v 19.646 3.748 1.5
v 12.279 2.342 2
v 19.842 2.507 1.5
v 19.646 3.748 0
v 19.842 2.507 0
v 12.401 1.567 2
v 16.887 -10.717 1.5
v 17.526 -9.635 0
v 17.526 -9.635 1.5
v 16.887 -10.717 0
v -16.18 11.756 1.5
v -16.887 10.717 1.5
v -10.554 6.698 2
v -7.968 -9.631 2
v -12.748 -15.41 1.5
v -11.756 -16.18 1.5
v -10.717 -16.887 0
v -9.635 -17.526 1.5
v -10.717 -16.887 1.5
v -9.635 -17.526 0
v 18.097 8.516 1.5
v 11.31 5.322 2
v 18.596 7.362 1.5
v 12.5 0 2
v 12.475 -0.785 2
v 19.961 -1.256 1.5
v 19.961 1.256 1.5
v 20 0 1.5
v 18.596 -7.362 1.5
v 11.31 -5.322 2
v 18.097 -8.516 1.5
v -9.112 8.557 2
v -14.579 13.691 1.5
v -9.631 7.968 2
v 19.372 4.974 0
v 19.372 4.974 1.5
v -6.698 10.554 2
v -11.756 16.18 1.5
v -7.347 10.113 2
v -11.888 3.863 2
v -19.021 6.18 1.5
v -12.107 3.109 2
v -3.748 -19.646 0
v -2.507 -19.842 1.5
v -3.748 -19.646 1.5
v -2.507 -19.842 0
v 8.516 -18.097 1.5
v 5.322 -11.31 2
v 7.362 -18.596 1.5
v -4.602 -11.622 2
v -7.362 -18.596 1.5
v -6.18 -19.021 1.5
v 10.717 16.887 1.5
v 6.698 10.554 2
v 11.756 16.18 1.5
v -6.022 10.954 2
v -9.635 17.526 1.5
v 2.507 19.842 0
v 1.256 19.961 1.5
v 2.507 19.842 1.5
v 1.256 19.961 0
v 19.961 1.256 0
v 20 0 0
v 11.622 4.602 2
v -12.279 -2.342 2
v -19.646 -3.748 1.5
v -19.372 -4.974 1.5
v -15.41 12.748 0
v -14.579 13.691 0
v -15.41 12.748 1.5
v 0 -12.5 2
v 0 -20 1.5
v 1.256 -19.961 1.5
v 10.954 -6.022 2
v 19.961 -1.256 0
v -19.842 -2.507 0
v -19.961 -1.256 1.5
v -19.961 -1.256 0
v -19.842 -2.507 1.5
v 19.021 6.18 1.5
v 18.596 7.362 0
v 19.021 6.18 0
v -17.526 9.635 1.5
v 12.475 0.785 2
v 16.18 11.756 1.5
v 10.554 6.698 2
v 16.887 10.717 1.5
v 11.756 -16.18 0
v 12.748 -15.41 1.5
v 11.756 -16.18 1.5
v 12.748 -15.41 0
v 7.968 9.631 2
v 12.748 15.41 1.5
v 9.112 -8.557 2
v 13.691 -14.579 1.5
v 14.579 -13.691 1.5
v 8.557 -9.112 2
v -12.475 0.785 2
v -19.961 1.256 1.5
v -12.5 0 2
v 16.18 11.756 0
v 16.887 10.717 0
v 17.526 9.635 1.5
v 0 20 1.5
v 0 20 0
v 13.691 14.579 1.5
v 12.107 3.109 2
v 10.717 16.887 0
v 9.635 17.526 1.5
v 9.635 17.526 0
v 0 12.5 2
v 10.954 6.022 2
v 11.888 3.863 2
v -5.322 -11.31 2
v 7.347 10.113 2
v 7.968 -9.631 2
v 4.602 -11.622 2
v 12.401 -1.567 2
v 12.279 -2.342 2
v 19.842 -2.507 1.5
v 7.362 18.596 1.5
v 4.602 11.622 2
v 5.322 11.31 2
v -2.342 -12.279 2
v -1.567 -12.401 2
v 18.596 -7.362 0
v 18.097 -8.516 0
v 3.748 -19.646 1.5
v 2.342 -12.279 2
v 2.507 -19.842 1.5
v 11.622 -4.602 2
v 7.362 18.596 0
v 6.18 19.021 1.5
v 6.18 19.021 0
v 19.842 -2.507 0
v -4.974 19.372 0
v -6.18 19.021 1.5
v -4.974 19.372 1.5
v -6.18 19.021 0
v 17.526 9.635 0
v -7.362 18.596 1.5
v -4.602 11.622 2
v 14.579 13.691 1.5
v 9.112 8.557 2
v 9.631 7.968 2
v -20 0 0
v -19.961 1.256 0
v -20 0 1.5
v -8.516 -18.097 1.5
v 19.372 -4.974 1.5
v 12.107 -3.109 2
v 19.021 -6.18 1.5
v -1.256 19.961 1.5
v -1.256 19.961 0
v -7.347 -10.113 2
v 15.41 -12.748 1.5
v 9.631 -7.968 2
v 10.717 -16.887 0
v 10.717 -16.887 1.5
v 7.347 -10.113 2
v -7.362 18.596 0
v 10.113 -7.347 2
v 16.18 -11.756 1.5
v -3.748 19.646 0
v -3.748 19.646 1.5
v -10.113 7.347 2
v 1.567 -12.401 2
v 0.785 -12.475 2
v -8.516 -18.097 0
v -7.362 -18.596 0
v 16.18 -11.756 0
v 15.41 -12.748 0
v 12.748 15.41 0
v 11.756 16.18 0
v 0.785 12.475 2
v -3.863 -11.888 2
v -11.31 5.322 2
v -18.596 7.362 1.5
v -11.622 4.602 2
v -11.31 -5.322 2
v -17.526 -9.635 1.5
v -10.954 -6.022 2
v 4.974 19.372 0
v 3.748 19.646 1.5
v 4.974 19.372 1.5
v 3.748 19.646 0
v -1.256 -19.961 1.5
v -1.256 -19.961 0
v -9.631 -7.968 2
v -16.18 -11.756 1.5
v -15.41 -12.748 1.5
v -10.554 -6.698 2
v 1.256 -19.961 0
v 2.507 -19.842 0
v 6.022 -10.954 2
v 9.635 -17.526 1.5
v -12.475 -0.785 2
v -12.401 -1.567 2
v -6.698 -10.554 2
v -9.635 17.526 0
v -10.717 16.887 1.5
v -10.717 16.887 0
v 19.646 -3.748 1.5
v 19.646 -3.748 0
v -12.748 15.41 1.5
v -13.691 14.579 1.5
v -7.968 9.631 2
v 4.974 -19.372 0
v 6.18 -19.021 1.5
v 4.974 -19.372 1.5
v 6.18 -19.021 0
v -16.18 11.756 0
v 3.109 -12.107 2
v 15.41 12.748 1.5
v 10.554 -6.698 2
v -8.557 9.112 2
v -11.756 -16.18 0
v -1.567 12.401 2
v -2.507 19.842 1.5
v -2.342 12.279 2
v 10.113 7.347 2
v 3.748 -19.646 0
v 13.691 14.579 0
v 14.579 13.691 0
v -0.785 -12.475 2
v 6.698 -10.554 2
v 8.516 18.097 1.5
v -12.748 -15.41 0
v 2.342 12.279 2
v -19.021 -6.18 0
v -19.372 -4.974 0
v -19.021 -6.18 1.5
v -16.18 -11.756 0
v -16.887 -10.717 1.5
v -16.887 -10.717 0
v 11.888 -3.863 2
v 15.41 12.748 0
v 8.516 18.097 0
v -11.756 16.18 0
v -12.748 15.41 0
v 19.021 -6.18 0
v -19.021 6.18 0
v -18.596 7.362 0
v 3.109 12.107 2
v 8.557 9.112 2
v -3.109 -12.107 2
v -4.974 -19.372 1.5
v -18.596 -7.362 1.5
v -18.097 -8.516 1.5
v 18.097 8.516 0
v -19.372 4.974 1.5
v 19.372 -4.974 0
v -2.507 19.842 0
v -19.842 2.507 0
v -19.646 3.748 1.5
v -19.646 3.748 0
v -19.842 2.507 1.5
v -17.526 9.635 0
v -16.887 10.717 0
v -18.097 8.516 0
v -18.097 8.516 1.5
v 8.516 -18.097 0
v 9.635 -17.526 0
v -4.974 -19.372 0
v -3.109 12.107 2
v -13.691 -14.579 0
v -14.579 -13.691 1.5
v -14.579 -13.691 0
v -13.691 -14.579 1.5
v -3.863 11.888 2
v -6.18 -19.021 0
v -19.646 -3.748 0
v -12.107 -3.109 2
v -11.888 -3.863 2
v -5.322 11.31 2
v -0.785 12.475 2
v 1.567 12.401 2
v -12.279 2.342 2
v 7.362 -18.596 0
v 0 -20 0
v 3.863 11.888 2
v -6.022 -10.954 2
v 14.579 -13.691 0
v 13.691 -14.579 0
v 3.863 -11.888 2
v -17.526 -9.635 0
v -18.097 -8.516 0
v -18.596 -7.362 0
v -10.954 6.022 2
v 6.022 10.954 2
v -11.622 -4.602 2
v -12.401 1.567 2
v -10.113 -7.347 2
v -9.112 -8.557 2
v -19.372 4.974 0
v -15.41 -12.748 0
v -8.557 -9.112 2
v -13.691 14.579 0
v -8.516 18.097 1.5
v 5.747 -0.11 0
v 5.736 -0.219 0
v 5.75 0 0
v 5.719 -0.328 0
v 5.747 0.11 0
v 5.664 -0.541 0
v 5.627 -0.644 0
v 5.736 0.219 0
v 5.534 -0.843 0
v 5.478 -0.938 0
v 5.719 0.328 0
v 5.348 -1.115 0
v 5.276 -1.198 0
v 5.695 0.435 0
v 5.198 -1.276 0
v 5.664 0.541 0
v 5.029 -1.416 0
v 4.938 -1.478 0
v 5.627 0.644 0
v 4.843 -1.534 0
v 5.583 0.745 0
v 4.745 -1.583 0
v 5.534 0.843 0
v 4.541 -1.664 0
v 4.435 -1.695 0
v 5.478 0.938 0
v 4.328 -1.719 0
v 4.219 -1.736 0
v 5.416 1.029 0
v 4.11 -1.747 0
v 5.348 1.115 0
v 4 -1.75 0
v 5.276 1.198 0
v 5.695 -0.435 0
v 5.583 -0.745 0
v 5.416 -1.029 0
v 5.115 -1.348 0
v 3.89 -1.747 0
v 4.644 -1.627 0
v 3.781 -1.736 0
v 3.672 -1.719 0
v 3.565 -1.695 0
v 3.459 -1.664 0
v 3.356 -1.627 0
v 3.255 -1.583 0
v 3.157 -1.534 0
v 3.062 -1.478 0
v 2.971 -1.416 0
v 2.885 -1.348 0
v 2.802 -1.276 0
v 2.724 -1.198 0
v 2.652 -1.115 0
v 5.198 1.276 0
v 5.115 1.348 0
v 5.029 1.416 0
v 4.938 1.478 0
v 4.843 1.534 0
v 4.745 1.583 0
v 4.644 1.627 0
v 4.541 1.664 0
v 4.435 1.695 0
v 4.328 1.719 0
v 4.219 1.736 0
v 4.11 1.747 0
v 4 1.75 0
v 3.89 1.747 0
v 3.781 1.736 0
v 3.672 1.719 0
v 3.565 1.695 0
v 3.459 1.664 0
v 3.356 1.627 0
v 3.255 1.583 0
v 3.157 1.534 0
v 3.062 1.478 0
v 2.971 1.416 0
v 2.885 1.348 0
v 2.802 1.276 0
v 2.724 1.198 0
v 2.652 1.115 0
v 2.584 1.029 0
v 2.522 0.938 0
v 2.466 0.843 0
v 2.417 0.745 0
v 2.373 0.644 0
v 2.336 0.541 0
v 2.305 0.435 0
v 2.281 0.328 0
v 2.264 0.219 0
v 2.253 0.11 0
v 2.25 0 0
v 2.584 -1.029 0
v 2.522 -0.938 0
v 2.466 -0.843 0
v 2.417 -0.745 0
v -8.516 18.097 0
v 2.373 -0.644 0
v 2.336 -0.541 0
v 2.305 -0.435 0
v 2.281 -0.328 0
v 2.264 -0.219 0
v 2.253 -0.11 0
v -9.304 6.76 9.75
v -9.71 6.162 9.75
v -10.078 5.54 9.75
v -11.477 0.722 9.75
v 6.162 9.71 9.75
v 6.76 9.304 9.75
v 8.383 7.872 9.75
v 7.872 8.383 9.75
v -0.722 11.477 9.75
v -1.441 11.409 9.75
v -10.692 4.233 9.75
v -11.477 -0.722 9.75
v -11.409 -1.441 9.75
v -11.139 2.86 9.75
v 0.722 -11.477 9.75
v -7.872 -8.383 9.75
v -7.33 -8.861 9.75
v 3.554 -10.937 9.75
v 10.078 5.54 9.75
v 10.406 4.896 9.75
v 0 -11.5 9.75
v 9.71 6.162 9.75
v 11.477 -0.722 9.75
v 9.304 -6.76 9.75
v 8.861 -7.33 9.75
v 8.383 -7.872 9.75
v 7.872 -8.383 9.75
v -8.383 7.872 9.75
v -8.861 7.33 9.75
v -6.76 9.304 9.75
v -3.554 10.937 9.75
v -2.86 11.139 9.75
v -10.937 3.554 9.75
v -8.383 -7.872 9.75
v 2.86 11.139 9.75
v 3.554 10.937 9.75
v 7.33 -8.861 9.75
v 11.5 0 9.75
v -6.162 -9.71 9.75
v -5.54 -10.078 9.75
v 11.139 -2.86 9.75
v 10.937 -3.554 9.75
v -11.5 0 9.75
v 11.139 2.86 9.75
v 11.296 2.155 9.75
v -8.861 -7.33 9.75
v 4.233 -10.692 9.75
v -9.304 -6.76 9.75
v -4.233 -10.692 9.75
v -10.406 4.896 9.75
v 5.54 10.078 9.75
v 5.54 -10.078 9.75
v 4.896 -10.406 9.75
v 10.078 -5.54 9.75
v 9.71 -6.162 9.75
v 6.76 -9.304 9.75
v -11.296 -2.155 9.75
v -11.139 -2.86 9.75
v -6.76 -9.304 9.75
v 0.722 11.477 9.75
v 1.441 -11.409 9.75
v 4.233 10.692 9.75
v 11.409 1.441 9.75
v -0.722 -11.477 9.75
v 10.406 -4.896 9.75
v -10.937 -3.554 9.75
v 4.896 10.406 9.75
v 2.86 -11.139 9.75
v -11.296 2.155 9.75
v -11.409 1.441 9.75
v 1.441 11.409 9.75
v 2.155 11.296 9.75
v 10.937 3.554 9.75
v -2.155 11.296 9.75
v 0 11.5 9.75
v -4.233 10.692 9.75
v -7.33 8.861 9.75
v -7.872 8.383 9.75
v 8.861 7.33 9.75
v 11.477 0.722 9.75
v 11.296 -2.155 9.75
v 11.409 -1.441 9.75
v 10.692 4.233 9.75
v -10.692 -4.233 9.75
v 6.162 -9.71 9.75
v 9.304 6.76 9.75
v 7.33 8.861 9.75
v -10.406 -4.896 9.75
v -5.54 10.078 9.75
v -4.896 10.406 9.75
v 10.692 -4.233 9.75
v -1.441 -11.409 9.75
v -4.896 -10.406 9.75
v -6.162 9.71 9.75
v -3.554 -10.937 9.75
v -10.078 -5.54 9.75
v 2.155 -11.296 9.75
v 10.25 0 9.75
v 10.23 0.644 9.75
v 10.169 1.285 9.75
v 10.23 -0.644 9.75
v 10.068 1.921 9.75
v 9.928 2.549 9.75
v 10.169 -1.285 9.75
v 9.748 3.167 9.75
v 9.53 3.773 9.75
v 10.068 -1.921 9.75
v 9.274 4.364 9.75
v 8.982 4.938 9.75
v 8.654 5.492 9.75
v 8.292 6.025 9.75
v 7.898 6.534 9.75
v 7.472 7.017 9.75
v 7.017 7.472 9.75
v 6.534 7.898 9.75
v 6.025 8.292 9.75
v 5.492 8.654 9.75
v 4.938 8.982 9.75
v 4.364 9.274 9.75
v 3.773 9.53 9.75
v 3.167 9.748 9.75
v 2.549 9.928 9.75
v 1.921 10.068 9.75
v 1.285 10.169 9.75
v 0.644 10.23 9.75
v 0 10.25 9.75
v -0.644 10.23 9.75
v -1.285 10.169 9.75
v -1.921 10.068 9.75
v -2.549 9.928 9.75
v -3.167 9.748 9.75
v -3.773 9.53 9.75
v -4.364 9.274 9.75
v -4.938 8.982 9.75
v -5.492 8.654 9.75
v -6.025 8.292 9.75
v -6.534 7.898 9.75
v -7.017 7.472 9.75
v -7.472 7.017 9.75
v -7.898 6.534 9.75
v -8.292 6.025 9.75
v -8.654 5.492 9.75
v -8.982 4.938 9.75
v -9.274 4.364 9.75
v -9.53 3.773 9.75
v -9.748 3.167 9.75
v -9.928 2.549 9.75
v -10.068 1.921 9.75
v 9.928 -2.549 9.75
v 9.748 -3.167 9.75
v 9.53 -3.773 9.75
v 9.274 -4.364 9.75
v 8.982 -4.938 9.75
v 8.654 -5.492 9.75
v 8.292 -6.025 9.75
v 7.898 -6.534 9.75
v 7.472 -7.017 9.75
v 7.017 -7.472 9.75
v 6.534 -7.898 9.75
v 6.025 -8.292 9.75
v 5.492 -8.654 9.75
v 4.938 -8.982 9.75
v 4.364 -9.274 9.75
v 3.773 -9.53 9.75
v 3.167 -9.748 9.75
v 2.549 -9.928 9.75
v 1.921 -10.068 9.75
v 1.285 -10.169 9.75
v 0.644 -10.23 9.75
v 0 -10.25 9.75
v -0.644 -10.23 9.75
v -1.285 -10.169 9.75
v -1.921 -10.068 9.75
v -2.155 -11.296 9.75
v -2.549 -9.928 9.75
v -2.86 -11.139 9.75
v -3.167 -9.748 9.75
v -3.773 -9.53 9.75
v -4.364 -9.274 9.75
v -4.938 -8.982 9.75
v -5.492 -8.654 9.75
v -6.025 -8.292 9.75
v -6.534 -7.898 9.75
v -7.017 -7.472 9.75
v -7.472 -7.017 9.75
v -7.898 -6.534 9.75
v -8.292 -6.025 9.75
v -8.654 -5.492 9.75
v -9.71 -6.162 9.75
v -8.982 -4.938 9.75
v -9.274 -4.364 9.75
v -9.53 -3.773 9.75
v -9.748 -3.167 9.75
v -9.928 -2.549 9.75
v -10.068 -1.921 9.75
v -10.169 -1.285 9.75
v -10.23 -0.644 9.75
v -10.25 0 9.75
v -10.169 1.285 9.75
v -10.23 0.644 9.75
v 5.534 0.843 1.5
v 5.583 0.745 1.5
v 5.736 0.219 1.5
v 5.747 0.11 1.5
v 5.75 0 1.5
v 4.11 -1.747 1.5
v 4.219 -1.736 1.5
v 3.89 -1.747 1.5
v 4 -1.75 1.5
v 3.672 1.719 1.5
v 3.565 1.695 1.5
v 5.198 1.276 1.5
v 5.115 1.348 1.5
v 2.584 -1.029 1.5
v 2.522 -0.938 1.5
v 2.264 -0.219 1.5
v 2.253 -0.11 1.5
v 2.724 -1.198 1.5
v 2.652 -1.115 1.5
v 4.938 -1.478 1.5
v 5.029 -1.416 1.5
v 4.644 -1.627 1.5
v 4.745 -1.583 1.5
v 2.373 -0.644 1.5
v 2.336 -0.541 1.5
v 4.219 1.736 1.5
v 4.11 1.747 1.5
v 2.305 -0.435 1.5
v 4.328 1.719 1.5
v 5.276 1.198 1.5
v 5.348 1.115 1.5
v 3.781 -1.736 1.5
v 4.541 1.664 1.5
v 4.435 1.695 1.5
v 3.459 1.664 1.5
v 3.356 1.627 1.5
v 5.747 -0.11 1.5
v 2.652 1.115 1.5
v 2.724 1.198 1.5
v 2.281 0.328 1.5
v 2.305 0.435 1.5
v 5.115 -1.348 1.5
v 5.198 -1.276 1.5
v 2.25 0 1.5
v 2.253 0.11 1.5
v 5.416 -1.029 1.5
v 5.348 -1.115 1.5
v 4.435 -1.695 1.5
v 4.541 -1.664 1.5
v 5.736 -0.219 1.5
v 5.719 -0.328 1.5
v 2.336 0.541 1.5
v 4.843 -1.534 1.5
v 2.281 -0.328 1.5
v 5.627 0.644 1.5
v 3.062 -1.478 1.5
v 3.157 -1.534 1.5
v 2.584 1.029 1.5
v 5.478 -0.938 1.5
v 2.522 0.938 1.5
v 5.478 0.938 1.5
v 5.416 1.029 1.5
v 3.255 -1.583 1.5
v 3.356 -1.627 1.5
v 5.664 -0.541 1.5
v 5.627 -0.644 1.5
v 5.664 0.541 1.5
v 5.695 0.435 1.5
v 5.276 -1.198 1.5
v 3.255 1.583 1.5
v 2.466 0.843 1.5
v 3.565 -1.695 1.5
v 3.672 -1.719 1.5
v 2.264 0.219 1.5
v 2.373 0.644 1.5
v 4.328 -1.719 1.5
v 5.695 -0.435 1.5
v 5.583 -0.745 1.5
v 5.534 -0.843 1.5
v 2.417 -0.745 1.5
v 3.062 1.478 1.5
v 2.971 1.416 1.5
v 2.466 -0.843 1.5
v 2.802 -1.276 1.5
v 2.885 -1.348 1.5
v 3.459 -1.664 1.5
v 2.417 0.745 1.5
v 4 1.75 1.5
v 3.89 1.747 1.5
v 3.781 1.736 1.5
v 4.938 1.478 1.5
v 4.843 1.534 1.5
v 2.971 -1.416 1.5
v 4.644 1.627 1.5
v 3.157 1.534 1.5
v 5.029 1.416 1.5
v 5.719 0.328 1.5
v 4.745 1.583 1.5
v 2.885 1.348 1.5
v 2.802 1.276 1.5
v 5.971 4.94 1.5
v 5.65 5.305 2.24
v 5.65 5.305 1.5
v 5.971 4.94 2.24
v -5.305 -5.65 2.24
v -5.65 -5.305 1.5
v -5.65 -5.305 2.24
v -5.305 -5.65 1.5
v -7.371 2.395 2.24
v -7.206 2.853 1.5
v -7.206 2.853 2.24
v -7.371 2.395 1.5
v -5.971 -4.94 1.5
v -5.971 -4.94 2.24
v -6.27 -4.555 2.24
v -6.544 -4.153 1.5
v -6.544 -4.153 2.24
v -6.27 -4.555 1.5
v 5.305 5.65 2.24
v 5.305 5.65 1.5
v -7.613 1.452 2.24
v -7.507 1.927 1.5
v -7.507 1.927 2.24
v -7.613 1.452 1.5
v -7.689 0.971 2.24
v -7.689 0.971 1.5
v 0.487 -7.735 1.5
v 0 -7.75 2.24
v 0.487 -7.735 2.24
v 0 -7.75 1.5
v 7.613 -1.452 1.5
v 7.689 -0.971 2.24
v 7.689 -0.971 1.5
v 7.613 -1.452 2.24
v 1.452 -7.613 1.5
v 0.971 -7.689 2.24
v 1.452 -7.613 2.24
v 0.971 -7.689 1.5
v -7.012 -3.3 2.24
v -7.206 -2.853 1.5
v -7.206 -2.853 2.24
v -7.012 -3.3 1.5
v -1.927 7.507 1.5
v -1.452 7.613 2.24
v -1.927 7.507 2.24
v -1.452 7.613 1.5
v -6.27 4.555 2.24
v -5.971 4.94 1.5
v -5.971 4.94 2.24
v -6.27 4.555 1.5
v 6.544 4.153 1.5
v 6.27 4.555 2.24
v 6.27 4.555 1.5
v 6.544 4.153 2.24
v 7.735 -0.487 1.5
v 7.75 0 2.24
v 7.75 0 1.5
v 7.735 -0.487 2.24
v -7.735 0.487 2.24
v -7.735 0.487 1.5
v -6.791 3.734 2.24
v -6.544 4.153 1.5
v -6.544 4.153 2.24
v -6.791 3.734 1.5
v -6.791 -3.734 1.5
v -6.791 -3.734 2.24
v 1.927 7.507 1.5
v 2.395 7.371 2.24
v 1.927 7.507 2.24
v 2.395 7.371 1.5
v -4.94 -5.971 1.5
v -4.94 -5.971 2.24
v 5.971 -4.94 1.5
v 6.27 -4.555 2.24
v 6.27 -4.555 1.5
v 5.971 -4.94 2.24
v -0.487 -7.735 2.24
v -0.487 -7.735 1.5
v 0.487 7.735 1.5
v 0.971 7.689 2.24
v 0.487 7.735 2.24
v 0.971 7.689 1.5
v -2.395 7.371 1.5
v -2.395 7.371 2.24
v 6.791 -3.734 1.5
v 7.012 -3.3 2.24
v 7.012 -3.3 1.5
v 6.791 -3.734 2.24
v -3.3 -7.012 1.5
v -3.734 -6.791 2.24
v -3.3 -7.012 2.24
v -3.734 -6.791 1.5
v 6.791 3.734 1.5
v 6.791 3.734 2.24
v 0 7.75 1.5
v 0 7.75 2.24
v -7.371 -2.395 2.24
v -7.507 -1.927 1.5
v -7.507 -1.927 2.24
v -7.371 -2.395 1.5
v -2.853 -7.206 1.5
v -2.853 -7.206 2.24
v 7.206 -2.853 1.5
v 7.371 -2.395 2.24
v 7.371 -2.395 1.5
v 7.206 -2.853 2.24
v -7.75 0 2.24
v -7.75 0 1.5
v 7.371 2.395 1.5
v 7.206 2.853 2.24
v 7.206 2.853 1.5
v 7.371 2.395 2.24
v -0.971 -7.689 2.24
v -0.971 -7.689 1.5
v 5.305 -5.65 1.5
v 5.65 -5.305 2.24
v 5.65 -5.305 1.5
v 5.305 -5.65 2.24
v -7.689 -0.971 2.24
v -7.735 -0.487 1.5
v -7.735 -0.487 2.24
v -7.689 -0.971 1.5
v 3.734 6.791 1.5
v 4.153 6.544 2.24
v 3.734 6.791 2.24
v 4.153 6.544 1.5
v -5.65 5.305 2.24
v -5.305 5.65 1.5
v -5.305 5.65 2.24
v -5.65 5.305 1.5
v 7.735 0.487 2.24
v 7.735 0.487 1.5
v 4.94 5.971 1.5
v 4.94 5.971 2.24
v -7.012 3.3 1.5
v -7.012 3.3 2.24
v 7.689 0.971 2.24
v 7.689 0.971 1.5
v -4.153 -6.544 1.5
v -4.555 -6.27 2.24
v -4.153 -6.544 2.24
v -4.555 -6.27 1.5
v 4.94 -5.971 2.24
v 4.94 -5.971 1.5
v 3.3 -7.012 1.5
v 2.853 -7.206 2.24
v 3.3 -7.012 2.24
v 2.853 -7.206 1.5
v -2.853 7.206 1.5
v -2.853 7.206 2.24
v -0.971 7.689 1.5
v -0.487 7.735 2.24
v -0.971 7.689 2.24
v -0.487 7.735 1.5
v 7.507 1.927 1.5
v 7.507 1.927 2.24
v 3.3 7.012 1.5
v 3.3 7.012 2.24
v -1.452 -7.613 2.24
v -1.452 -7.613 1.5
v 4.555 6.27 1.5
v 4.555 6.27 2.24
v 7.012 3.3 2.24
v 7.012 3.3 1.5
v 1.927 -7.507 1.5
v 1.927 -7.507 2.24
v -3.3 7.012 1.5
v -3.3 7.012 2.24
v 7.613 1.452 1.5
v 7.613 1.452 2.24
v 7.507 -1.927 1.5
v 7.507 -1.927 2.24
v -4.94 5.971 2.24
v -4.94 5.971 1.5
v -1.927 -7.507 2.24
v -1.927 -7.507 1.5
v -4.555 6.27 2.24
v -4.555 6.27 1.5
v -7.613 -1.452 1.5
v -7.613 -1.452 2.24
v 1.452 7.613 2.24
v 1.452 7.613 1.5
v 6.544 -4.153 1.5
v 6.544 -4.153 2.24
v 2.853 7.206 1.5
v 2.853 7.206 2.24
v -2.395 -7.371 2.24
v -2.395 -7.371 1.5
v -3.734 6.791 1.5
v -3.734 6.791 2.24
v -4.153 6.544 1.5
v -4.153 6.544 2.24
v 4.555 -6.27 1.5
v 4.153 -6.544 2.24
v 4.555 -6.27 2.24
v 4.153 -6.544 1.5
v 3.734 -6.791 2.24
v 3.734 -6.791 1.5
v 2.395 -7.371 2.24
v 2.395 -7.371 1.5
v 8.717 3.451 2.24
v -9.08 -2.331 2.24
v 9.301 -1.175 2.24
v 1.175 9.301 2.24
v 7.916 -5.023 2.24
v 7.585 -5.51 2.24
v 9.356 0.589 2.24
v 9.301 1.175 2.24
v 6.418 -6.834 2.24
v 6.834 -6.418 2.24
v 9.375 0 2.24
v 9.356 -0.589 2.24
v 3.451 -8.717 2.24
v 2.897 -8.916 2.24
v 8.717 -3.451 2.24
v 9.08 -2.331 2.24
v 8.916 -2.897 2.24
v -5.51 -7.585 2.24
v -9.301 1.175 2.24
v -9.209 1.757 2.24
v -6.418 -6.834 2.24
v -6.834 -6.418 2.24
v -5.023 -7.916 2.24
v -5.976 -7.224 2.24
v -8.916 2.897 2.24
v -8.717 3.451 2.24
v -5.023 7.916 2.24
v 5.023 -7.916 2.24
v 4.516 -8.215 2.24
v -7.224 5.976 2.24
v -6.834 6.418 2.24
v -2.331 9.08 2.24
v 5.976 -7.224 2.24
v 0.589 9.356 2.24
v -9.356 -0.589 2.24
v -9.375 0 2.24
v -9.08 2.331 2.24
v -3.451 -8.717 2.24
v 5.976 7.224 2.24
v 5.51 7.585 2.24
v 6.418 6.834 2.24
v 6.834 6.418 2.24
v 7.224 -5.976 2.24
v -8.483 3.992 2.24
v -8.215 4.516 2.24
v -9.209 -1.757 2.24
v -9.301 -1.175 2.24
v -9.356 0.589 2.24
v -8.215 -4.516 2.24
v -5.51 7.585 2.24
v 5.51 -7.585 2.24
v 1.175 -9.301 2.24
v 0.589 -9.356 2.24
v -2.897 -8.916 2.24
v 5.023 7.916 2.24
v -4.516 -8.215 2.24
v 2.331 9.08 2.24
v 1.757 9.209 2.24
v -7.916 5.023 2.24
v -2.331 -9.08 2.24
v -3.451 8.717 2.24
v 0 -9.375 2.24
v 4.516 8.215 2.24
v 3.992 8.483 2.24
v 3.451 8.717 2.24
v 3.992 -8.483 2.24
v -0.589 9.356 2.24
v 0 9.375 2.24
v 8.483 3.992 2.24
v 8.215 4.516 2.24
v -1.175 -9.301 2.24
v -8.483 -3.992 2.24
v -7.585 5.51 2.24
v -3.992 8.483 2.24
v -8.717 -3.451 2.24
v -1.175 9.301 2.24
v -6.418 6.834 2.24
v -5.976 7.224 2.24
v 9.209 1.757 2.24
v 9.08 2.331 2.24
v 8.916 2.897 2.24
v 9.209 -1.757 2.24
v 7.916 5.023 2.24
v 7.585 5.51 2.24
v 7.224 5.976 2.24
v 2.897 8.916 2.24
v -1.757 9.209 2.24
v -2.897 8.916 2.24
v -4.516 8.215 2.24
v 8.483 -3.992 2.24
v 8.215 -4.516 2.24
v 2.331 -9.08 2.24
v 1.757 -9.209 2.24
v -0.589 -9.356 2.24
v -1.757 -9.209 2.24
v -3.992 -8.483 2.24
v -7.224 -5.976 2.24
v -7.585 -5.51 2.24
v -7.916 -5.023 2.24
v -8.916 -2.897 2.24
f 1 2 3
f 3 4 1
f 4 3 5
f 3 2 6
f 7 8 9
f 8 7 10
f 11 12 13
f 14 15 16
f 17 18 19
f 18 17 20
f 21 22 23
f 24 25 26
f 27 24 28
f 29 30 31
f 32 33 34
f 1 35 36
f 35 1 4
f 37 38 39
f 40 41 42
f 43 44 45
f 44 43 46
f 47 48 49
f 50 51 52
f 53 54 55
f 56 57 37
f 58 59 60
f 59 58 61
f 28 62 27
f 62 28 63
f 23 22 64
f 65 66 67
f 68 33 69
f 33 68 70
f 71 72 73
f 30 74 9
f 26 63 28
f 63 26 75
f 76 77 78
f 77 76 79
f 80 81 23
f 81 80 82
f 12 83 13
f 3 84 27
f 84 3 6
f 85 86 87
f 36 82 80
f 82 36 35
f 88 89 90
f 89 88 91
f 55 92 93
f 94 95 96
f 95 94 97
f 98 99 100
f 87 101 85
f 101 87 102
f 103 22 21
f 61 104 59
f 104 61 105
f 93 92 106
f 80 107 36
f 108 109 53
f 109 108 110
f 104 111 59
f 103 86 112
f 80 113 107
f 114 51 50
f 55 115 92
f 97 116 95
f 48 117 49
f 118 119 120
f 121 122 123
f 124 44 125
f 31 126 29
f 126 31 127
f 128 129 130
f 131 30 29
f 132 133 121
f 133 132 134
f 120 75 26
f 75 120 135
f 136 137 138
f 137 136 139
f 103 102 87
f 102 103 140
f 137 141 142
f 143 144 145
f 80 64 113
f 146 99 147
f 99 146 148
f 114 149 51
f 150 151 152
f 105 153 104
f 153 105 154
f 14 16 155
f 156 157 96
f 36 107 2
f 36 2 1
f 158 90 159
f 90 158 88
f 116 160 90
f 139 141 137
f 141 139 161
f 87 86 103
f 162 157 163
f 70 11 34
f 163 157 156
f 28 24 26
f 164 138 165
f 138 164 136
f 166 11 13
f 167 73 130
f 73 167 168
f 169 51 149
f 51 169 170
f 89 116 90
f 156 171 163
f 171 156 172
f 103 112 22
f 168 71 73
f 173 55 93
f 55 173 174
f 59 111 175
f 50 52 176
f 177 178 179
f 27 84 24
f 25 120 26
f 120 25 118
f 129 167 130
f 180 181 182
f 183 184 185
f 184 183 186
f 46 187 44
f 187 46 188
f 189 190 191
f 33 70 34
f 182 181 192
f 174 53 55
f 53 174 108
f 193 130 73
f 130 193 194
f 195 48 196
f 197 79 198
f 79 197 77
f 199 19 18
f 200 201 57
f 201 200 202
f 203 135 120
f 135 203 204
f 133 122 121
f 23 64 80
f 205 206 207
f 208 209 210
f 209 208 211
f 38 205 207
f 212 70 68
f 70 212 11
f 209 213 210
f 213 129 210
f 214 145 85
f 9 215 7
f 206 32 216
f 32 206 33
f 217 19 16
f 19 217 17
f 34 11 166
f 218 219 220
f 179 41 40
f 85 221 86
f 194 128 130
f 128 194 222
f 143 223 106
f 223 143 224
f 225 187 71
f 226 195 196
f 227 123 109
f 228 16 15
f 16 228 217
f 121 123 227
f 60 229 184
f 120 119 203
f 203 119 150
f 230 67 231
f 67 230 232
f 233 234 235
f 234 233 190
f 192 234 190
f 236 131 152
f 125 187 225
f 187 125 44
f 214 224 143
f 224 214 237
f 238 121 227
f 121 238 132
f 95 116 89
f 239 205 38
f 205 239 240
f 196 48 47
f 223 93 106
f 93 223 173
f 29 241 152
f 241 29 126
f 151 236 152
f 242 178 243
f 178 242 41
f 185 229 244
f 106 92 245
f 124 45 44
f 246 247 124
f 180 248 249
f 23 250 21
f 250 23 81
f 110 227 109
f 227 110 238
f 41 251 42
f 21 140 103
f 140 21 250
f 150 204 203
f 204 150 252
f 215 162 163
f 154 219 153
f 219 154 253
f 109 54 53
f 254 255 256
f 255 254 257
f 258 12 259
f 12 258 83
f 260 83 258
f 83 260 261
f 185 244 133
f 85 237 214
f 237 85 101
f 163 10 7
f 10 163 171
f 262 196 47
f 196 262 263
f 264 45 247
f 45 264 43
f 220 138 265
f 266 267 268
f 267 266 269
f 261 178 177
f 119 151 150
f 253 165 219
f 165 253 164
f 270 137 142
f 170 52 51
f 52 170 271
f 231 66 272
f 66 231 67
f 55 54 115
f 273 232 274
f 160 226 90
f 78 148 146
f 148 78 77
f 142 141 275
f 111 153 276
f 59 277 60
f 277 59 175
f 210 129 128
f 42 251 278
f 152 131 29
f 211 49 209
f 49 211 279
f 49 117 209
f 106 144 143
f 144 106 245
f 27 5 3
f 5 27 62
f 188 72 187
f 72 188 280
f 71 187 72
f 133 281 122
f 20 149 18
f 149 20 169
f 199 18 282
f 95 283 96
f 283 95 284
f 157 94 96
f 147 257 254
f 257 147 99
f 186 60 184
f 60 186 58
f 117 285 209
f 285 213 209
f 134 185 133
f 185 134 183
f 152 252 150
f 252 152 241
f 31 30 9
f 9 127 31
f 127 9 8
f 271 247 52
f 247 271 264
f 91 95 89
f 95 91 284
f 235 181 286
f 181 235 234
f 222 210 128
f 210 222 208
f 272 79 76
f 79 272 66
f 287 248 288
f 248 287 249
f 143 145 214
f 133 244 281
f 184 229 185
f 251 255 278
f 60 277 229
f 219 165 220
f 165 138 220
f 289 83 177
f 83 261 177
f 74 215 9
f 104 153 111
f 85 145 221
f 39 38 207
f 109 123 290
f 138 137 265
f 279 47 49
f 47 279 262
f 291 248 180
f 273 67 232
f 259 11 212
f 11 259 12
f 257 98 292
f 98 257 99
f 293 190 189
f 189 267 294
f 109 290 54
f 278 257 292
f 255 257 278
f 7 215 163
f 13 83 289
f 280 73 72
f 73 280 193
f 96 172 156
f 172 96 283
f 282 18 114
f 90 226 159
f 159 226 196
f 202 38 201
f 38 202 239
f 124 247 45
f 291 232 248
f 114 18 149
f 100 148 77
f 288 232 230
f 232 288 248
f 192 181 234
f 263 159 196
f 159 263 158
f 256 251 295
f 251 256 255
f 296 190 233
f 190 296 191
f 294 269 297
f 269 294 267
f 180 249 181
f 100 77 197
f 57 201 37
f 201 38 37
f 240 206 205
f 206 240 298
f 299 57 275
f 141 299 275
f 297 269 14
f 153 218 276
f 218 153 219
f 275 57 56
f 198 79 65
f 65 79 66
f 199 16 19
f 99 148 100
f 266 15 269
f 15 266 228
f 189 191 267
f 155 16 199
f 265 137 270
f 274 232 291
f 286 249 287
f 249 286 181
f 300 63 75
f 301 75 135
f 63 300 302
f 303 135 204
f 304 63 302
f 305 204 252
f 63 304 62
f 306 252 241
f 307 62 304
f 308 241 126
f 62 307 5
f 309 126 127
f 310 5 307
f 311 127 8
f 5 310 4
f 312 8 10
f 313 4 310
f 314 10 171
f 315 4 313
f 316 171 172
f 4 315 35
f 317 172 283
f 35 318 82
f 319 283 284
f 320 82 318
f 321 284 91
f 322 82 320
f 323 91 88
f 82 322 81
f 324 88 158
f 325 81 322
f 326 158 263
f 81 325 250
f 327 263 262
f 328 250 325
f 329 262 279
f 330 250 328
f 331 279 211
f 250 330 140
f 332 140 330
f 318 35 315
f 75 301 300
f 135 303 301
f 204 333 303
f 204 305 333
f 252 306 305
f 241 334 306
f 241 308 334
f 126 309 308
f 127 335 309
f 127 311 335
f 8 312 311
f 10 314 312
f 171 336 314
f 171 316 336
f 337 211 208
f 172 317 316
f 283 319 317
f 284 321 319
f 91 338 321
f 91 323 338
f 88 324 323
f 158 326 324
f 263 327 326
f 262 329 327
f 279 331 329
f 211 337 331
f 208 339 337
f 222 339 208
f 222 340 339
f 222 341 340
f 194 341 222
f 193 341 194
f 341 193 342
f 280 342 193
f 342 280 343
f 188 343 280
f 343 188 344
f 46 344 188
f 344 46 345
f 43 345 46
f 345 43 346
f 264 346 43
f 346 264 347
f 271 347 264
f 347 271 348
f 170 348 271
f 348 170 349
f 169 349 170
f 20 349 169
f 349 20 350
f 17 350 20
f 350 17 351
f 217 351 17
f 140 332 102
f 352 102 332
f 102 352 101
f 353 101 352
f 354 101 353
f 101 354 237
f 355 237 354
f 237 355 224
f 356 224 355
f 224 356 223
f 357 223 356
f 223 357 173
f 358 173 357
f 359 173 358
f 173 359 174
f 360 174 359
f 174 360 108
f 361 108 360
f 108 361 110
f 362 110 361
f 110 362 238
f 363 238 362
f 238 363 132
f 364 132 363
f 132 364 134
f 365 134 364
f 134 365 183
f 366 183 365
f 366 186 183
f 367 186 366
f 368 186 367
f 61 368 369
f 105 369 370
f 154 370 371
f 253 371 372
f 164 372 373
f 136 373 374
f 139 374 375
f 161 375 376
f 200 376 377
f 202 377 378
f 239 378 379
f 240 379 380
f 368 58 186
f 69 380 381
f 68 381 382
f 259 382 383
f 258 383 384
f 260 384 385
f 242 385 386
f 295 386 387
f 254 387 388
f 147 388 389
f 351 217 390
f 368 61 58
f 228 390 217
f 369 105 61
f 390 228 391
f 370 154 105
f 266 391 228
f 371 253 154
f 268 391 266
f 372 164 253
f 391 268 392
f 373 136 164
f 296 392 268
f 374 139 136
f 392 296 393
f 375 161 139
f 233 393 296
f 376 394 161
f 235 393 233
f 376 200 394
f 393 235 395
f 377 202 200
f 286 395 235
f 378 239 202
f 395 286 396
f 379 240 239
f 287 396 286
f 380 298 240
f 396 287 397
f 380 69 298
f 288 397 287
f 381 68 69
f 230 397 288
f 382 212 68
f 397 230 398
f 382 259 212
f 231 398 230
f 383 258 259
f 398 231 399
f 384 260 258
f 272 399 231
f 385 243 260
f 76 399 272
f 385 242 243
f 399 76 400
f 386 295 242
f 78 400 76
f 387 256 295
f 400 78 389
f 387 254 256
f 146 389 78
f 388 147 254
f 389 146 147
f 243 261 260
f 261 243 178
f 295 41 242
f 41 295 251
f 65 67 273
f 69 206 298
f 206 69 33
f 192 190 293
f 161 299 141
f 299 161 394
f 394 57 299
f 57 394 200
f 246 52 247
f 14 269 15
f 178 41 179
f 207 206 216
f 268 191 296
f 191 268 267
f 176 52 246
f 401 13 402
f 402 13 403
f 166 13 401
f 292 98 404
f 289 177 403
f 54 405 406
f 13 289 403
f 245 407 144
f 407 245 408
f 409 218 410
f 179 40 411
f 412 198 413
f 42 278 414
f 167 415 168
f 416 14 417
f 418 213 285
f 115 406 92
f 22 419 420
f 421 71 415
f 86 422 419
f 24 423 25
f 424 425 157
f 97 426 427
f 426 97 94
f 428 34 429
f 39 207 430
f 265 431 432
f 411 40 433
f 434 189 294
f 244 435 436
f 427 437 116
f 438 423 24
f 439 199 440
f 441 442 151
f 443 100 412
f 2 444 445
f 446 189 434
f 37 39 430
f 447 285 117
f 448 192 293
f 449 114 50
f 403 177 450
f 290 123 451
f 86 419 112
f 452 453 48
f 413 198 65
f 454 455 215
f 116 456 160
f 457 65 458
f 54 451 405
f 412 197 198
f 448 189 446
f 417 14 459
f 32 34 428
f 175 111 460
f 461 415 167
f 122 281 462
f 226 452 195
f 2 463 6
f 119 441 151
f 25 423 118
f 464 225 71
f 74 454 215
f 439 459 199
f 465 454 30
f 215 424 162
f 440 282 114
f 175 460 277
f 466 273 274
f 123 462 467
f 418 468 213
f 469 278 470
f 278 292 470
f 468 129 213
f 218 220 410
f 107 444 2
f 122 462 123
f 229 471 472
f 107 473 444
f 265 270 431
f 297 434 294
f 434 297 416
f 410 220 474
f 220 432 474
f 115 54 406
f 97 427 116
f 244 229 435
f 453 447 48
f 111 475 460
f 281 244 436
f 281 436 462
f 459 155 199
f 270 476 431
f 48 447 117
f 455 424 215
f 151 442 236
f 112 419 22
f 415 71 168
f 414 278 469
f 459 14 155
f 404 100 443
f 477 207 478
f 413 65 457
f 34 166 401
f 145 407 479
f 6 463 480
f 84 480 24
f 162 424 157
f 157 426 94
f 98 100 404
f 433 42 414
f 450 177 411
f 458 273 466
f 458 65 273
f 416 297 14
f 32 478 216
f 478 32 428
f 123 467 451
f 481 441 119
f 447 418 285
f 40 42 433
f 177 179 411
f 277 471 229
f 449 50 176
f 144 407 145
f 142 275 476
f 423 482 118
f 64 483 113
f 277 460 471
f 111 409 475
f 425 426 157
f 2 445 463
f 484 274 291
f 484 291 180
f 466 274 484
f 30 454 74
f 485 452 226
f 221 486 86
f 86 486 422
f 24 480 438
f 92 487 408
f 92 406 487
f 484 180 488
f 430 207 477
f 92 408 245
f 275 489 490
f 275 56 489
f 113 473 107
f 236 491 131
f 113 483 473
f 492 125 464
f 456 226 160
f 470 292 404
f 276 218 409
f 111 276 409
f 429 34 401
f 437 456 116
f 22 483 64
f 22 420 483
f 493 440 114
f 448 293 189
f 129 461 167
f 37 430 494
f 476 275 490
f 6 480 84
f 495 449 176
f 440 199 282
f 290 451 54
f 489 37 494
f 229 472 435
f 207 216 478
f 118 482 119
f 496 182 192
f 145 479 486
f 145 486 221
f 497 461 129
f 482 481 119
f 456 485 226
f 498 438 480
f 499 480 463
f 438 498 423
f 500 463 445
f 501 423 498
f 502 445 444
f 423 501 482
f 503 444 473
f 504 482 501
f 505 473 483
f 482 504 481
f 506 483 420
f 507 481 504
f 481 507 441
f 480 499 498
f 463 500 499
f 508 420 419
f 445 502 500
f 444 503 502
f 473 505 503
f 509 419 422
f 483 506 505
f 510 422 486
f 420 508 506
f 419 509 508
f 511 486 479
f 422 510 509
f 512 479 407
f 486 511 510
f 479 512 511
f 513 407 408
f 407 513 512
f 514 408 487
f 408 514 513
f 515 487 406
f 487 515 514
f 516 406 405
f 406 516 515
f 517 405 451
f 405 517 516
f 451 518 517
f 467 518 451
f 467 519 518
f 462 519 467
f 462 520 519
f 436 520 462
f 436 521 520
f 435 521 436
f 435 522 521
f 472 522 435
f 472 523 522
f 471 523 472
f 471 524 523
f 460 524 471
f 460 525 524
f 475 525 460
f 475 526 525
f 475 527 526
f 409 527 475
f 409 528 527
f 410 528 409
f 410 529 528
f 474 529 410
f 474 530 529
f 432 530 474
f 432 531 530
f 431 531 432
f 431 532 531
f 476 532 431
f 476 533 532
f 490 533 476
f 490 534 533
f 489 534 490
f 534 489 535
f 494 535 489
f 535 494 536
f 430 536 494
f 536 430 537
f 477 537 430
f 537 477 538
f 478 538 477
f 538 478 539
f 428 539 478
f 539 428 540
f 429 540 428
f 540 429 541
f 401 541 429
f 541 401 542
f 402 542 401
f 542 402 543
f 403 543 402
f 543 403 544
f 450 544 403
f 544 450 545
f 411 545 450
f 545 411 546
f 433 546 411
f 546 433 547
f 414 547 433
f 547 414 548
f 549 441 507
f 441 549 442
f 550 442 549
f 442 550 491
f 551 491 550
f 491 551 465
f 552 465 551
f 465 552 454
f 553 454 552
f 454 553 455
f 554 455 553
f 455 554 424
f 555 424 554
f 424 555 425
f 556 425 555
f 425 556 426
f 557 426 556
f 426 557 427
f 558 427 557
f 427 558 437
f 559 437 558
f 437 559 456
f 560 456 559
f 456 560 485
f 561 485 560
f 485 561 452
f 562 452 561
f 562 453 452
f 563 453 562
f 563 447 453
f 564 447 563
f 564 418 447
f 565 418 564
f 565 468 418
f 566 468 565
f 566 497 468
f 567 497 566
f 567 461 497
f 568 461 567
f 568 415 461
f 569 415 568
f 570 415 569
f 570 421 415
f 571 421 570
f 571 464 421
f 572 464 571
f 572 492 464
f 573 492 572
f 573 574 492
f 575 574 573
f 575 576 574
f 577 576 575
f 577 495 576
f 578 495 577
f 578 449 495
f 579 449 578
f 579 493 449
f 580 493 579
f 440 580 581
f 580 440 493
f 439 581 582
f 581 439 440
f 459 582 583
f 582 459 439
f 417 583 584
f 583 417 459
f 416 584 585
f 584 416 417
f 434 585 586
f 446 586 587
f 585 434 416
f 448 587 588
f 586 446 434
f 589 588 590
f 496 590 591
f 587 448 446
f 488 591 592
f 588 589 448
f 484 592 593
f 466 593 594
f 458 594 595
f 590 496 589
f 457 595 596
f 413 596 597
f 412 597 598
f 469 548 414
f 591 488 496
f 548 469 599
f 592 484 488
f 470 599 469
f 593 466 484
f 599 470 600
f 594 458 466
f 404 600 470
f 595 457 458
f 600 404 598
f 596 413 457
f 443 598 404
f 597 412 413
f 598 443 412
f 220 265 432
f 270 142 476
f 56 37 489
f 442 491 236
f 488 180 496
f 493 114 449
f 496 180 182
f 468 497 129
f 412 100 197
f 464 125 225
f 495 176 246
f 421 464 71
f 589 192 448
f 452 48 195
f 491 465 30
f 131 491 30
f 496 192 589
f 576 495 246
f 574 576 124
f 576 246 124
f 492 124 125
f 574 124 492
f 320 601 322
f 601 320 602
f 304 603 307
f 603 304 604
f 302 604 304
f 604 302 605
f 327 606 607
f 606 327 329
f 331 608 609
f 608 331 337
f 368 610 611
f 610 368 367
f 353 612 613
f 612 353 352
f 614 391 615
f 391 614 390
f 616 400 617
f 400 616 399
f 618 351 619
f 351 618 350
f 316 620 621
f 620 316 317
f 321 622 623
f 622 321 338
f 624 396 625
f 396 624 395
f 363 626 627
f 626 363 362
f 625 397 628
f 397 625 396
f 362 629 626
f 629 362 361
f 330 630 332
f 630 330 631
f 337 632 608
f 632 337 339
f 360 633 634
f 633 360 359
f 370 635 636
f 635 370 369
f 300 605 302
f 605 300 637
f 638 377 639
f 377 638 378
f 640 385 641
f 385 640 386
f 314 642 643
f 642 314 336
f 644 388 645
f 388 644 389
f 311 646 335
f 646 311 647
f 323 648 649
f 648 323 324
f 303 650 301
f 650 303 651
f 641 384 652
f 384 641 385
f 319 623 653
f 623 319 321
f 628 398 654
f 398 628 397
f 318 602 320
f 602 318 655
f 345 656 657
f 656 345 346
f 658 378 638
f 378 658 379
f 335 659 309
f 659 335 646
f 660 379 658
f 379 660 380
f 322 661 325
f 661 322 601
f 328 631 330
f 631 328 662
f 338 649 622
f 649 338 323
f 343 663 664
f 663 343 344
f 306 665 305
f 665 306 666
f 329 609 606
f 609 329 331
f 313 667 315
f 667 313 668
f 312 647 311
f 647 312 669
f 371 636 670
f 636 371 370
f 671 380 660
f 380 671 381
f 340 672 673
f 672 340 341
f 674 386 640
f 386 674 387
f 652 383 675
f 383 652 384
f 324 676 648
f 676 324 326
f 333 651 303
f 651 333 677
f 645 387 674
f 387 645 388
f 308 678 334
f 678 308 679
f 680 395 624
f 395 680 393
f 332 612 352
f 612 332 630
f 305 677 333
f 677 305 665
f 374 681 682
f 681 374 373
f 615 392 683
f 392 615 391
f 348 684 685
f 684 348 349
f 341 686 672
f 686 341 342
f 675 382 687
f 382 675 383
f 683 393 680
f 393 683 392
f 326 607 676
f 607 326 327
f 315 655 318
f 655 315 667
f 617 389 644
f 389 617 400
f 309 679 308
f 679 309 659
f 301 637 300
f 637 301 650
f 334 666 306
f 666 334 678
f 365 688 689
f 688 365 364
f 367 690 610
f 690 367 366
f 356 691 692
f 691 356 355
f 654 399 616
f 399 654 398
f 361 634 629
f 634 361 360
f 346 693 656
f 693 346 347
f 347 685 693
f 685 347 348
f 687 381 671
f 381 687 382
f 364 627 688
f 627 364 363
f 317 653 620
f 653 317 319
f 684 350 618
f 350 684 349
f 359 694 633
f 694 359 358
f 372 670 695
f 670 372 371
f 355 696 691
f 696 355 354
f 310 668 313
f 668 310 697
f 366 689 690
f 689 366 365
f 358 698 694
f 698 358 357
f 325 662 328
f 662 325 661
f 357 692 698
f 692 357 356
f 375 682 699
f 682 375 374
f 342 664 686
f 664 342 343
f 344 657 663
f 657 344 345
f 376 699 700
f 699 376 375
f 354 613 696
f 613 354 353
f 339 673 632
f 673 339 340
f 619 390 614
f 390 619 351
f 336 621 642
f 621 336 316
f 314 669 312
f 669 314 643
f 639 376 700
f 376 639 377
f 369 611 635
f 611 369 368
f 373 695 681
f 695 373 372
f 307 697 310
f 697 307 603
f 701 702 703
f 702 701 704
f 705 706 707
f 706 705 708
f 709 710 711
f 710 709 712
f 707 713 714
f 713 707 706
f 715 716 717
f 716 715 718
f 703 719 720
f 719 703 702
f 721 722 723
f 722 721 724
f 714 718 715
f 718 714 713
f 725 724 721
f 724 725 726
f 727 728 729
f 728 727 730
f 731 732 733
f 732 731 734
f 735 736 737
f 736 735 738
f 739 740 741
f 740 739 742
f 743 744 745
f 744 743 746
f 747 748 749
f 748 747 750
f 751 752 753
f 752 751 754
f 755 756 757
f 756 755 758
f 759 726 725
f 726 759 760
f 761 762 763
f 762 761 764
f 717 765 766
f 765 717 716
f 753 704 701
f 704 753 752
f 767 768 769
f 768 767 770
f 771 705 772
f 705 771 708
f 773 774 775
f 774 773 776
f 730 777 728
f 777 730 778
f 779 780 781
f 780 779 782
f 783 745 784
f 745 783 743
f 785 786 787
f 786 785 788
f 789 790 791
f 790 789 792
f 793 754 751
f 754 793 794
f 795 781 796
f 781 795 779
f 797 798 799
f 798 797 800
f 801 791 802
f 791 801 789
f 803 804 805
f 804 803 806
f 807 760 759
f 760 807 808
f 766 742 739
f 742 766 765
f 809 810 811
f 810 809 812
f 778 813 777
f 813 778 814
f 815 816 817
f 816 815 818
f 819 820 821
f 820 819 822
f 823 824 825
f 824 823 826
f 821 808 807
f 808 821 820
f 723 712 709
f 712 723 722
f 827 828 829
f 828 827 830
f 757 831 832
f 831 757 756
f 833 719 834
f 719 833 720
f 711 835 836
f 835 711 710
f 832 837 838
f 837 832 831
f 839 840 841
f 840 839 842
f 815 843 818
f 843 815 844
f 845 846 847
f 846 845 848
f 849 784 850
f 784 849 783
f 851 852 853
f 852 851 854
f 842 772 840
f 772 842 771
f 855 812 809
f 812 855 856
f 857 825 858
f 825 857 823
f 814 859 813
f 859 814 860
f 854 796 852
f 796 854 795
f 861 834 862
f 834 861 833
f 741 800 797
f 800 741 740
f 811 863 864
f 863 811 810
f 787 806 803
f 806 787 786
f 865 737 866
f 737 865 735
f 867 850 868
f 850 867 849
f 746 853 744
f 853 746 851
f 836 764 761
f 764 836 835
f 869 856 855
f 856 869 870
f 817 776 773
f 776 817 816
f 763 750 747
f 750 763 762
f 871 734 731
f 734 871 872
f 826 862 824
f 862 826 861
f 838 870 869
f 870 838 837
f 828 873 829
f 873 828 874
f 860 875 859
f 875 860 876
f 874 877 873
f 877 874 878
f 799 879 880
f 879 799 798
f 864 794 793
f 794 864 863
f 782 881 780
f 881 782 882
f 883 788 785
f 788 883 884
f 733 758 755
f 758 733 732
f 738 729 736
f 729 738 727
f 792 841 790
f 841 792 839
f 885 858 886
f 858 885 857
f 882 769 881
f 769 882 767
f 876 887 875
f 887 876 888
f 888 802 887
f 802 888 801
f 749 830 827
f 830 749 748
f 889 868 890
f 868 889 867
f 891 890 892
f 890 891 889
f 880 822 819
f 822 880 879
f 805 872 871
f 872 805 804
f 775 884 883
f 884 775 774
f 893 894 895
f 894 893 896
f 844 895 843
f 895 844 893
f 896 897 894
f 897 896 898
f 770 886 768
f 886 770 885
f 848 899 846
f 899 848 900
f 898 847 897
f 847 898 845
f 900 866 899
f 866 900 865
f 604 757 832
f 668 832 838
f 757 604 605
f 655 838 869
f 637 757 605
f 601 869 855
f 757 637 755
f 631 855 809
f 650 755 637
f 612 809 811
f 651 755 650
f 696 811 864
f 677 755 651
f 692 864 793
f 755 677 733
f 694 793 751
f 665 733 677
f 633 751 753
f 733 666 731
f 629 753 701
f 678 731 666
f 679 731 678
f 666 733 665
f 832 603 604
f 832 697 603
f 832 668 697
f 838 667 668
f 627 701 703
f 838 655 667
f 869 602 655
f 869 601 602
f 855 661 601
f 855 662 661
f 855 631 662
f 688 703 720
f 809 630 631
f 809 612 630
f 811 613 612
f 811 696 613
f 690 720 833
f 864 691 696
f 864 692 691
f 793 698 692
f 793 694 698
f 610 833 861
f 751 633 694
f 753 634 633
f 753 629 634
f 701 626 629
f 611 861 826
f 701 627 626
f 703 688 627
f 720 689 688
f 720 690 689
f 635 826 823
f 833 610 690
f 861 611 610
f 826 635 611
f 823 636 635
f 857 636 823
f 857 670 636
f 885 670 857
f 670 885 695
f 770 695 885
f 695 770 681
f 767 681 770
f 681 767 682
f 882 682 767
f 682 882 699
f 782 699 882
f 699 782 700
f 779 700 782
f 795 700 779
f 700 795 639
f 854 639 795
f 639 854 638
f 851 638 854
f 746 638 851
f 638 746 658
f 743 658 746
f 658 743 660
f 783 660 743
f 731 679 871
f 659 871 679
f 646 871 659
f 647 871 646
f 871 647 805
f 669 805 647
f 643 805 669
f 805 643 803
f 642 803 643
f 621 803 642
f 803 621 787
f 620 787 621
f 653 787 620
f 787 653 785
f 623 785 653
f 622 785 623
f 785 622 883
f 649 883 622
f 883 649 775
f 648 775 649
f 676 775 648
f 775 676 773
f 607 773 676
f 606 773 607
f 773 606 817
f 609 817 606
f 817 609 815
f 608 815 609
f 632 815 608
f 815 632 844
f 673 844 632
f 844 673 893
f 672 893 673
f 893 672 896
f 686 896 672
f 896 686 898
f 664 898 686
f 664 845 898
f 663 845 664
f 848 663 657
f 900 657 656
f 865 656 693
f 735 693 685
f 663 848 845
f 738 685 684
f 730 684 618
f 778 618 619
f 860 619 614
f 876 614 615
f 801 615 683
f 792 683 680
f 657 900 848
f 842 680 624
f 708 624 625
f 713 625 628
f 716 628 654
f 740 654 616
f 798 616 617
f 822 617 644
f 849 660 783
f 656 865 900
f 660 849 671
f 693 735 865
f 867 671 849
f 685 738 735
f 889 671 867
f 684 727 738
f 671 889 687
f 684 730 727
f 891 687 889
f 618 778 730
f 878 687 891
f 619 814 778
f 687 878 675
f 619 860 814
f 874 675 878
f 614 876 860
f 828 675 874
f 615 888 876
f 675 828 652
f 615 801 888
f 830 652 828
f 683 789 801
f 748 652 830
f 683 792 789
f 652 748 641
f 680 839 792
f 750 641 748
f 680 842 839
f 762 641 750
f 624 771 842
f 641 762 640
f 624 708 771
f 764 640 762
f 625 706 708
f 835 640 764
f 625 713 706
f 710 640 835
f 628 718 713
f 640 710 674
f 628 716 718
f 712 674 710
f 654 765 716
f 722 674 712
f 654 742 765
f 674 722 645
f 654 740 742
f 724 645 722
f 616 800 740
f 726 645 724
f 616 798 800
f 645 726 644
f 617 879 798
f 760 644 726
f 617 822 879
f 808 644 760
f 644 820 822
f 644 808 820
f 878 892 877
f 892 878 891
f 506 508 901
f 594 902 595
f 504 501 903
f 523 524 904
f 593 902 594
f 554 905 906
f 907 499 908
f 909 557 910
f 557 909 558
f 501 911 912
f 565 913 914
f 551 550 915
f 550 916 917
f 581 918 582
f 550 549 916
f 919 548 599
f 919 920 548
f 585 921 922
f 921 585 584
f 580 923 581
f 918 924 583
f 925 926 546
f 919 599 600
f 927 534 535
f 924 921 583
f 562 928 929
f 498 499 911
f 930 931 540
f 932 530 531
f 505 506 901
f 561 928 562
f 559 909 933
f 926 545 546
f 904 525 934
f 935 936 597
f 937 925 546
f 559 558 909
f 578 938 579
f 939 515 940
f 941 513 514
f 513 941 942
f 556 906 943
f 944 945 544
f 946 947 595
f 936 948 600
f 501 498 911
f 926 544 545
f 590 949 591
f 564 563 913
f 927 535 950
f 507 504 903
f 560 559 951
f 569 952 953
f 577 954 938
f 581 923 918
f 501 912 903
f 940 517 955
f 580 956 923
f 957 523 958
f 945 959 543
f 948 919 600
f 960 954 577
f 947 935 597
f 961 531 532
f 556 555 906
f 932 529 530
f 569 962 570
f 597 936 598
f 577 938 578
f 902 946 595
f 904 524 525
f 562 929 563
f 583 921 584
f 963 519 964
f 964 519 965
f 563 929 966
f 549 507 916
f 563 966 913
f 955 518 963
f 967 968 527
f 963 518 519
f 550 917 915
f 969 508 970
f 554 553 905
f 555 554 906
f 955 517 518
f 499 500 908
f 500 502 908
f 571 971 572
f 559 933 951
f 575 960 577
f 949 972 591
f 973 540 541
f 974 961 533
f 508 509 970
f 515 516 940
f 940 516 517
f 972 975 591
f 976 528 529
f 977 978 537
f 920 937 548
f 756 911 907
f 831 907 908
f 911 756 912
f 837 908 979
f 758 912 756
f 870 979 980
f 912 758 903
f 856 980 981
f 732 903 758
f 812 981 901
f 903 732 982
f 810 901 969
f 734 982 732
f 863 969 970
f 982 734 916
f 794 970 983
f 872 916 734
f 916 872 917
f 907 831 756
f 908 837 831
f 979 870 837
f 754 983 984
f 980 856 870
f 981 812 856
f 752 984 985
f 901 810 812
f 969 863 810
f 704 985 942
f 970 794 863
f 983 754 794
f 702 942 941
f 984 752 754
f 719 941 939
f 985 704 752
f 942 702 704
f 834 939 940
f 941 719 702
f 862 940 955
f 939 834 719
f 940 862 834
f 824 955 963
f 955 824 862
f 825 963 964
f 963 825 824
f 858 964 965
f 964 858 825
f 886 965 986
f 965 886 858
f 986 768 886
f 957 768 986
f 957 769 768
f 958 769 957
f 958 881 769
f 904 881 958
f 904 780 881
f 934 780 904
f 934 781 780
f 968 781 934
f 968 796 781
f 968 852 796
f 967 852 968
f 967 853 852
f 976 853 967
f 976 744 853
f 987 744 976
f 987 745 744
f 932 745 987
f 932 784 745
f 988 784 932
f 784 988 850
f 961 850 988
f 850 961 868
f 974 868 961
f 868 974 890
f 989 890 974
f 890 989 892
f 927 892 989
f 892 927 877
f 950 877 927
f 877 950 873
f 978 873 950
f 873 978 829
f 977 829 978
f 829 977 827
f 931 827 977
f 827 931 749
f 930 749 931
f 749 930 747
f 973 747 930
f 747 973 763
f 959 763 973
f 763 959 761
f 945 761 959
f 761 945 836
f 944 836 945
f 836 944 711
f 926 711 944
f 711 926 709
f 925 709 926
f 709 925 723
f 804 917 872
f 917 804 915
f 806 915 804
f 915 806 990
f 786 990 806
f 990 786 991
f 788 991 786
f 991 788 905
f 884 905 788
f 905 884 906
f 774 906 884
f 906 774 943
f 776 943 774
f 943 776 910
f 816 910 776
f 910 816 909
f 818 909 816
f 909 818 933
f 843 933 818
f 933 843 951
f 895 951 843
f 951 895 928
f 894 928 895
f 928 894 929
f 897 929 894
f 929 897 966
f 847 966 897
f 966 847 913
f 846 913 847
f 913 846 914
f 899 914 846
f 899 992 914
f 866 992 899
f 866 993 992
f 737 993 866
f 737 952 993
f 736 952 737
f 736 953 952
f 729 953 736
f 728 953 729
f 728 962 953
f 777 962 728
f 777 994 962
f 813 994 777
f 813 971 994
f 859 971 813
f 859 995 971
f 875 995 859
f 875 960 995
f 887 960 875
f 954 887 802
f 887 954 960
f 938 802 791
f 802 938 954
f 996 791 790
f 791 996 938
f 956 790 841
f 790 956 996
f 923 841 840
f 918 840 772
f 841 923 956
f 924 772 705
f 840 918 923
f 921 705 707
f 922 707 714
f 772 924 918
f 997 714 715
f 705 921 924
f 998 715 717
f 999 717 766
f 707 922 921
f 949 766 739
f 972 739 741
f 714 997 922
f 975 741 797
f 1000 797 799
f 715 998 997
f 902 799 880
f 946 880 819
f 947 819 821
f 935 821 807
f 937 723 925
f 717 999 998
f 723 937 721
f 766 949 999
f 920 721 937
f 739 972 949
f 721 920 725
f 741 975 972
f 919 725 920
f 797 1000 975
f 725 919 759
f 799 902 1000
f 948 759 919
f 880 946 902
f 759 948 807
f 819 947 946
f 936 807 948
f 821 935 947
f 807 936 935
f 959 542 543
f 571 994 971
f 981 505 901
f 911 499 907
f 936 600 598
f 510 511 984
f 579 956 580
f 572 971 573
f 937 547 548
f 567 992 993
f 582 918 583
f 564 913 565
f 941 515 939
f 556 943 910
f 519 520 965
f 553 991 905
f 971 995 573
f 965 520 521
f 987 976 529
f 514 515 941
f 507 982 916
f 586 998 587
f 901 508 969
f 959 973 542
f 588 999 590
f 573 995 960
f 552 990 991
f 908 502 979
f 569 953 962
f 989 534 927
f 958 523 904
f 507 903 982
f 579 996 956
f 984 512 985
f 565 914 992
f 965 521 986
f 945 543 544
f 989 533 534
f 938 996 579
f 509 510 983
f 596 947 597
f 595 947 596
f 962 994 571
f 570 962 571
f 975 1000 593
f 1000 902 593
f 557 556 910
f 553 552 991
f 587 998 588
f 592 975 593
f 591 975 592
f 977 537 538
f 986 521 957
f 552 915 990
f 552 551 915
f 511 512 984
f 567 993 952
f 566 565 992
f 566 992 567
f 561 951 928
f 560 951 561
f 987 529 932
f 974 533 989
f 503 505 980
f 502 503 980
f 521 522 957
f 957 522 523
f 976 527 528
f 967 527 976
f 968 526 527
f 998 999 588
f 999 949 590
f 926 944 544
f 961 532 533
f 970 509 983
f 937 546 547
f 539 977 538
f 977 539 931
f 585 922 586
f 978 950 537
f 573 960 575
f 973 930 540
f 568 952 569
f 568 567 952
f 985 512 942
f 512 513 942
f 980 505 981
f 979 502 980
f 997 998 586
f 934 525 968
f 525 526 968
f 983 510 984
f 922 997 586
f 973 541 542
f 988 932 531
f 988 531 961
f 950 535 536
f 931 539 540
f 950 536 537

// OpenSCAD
$fn = 100;

FOOT_DIAM = 40;
FOOT_THICK_OUTER = 1.5;
FOOT_THICK_MID = 2;
FOOT_THICK_INNER = 2.25;
INNER_THIN_THICK = 1.5;
INNER_THIN_DIAM = 15.5;

RANDOM_HOLE_OFFS = 4;
RANDOM_HOLE_DIAM = 3.5;

SOCKET_INNER_BOTTOM = 18.75;
SOCKET_INNER_TOP = 20.5;
SOCKET_INNER_ADJUST = 0.0;
SOCKET_OUTER_TOP = 23;
SOCKET_OUTER_BOTTOM = 25;

TOTAL_HEIGHT = 9.75;

difference() {
    union() {
        hull() {
            linear_extrude(FOOT_THICK_OUTER)
            circle(d=FOOT_DIAM)
                ;
            linear_extrude(FOOT_THICK_MID)
            circle(d=SOCKET_OUTER_BOTTOM)
                ;
        }
            ;
        hull() {
            linear_extrude(FOOT_THICK_MID)
            circle(d=SOCKET_OUTER_BOTTOM)
                ;
            linear_extrude(TOTAL_HEIGHT)
            circle(d=SOCKET_OUTER_TOP)
                ;
        }
            ;
        linear_extrude(FOOT_THICK_INNER)
        circle(d=SOCKET_INNER_TOP)
            ;
    }
        ;
    linear_extrude(999, center=true)
    translate([RANDOM_HOLE_OFFS, 0])
    circle(d=RANDOM_HOLE_DIAM)
        ;
    translate([0, 0, INNER_THIN_THICK])
    linear_extrude(999)
    circle(d=INNER_THIN_DIAM)
        ;
    hull() {
        translate([0, 0, FOOT_THICK_INNER - 0.01])
        linear_extrude(0.01)
        circle(d=SOCKET_INNER_BOTTOM + SOCKET_INNER_ADJUST)
            ;
        translate([0, 0, TOTAL_HEIGHT])
        linear_extrude(0.01)
        circle(d=SOCKET_INNER_TOP + SOCKET_INNER_ADJUST)
            ;
    }
        ;
}
